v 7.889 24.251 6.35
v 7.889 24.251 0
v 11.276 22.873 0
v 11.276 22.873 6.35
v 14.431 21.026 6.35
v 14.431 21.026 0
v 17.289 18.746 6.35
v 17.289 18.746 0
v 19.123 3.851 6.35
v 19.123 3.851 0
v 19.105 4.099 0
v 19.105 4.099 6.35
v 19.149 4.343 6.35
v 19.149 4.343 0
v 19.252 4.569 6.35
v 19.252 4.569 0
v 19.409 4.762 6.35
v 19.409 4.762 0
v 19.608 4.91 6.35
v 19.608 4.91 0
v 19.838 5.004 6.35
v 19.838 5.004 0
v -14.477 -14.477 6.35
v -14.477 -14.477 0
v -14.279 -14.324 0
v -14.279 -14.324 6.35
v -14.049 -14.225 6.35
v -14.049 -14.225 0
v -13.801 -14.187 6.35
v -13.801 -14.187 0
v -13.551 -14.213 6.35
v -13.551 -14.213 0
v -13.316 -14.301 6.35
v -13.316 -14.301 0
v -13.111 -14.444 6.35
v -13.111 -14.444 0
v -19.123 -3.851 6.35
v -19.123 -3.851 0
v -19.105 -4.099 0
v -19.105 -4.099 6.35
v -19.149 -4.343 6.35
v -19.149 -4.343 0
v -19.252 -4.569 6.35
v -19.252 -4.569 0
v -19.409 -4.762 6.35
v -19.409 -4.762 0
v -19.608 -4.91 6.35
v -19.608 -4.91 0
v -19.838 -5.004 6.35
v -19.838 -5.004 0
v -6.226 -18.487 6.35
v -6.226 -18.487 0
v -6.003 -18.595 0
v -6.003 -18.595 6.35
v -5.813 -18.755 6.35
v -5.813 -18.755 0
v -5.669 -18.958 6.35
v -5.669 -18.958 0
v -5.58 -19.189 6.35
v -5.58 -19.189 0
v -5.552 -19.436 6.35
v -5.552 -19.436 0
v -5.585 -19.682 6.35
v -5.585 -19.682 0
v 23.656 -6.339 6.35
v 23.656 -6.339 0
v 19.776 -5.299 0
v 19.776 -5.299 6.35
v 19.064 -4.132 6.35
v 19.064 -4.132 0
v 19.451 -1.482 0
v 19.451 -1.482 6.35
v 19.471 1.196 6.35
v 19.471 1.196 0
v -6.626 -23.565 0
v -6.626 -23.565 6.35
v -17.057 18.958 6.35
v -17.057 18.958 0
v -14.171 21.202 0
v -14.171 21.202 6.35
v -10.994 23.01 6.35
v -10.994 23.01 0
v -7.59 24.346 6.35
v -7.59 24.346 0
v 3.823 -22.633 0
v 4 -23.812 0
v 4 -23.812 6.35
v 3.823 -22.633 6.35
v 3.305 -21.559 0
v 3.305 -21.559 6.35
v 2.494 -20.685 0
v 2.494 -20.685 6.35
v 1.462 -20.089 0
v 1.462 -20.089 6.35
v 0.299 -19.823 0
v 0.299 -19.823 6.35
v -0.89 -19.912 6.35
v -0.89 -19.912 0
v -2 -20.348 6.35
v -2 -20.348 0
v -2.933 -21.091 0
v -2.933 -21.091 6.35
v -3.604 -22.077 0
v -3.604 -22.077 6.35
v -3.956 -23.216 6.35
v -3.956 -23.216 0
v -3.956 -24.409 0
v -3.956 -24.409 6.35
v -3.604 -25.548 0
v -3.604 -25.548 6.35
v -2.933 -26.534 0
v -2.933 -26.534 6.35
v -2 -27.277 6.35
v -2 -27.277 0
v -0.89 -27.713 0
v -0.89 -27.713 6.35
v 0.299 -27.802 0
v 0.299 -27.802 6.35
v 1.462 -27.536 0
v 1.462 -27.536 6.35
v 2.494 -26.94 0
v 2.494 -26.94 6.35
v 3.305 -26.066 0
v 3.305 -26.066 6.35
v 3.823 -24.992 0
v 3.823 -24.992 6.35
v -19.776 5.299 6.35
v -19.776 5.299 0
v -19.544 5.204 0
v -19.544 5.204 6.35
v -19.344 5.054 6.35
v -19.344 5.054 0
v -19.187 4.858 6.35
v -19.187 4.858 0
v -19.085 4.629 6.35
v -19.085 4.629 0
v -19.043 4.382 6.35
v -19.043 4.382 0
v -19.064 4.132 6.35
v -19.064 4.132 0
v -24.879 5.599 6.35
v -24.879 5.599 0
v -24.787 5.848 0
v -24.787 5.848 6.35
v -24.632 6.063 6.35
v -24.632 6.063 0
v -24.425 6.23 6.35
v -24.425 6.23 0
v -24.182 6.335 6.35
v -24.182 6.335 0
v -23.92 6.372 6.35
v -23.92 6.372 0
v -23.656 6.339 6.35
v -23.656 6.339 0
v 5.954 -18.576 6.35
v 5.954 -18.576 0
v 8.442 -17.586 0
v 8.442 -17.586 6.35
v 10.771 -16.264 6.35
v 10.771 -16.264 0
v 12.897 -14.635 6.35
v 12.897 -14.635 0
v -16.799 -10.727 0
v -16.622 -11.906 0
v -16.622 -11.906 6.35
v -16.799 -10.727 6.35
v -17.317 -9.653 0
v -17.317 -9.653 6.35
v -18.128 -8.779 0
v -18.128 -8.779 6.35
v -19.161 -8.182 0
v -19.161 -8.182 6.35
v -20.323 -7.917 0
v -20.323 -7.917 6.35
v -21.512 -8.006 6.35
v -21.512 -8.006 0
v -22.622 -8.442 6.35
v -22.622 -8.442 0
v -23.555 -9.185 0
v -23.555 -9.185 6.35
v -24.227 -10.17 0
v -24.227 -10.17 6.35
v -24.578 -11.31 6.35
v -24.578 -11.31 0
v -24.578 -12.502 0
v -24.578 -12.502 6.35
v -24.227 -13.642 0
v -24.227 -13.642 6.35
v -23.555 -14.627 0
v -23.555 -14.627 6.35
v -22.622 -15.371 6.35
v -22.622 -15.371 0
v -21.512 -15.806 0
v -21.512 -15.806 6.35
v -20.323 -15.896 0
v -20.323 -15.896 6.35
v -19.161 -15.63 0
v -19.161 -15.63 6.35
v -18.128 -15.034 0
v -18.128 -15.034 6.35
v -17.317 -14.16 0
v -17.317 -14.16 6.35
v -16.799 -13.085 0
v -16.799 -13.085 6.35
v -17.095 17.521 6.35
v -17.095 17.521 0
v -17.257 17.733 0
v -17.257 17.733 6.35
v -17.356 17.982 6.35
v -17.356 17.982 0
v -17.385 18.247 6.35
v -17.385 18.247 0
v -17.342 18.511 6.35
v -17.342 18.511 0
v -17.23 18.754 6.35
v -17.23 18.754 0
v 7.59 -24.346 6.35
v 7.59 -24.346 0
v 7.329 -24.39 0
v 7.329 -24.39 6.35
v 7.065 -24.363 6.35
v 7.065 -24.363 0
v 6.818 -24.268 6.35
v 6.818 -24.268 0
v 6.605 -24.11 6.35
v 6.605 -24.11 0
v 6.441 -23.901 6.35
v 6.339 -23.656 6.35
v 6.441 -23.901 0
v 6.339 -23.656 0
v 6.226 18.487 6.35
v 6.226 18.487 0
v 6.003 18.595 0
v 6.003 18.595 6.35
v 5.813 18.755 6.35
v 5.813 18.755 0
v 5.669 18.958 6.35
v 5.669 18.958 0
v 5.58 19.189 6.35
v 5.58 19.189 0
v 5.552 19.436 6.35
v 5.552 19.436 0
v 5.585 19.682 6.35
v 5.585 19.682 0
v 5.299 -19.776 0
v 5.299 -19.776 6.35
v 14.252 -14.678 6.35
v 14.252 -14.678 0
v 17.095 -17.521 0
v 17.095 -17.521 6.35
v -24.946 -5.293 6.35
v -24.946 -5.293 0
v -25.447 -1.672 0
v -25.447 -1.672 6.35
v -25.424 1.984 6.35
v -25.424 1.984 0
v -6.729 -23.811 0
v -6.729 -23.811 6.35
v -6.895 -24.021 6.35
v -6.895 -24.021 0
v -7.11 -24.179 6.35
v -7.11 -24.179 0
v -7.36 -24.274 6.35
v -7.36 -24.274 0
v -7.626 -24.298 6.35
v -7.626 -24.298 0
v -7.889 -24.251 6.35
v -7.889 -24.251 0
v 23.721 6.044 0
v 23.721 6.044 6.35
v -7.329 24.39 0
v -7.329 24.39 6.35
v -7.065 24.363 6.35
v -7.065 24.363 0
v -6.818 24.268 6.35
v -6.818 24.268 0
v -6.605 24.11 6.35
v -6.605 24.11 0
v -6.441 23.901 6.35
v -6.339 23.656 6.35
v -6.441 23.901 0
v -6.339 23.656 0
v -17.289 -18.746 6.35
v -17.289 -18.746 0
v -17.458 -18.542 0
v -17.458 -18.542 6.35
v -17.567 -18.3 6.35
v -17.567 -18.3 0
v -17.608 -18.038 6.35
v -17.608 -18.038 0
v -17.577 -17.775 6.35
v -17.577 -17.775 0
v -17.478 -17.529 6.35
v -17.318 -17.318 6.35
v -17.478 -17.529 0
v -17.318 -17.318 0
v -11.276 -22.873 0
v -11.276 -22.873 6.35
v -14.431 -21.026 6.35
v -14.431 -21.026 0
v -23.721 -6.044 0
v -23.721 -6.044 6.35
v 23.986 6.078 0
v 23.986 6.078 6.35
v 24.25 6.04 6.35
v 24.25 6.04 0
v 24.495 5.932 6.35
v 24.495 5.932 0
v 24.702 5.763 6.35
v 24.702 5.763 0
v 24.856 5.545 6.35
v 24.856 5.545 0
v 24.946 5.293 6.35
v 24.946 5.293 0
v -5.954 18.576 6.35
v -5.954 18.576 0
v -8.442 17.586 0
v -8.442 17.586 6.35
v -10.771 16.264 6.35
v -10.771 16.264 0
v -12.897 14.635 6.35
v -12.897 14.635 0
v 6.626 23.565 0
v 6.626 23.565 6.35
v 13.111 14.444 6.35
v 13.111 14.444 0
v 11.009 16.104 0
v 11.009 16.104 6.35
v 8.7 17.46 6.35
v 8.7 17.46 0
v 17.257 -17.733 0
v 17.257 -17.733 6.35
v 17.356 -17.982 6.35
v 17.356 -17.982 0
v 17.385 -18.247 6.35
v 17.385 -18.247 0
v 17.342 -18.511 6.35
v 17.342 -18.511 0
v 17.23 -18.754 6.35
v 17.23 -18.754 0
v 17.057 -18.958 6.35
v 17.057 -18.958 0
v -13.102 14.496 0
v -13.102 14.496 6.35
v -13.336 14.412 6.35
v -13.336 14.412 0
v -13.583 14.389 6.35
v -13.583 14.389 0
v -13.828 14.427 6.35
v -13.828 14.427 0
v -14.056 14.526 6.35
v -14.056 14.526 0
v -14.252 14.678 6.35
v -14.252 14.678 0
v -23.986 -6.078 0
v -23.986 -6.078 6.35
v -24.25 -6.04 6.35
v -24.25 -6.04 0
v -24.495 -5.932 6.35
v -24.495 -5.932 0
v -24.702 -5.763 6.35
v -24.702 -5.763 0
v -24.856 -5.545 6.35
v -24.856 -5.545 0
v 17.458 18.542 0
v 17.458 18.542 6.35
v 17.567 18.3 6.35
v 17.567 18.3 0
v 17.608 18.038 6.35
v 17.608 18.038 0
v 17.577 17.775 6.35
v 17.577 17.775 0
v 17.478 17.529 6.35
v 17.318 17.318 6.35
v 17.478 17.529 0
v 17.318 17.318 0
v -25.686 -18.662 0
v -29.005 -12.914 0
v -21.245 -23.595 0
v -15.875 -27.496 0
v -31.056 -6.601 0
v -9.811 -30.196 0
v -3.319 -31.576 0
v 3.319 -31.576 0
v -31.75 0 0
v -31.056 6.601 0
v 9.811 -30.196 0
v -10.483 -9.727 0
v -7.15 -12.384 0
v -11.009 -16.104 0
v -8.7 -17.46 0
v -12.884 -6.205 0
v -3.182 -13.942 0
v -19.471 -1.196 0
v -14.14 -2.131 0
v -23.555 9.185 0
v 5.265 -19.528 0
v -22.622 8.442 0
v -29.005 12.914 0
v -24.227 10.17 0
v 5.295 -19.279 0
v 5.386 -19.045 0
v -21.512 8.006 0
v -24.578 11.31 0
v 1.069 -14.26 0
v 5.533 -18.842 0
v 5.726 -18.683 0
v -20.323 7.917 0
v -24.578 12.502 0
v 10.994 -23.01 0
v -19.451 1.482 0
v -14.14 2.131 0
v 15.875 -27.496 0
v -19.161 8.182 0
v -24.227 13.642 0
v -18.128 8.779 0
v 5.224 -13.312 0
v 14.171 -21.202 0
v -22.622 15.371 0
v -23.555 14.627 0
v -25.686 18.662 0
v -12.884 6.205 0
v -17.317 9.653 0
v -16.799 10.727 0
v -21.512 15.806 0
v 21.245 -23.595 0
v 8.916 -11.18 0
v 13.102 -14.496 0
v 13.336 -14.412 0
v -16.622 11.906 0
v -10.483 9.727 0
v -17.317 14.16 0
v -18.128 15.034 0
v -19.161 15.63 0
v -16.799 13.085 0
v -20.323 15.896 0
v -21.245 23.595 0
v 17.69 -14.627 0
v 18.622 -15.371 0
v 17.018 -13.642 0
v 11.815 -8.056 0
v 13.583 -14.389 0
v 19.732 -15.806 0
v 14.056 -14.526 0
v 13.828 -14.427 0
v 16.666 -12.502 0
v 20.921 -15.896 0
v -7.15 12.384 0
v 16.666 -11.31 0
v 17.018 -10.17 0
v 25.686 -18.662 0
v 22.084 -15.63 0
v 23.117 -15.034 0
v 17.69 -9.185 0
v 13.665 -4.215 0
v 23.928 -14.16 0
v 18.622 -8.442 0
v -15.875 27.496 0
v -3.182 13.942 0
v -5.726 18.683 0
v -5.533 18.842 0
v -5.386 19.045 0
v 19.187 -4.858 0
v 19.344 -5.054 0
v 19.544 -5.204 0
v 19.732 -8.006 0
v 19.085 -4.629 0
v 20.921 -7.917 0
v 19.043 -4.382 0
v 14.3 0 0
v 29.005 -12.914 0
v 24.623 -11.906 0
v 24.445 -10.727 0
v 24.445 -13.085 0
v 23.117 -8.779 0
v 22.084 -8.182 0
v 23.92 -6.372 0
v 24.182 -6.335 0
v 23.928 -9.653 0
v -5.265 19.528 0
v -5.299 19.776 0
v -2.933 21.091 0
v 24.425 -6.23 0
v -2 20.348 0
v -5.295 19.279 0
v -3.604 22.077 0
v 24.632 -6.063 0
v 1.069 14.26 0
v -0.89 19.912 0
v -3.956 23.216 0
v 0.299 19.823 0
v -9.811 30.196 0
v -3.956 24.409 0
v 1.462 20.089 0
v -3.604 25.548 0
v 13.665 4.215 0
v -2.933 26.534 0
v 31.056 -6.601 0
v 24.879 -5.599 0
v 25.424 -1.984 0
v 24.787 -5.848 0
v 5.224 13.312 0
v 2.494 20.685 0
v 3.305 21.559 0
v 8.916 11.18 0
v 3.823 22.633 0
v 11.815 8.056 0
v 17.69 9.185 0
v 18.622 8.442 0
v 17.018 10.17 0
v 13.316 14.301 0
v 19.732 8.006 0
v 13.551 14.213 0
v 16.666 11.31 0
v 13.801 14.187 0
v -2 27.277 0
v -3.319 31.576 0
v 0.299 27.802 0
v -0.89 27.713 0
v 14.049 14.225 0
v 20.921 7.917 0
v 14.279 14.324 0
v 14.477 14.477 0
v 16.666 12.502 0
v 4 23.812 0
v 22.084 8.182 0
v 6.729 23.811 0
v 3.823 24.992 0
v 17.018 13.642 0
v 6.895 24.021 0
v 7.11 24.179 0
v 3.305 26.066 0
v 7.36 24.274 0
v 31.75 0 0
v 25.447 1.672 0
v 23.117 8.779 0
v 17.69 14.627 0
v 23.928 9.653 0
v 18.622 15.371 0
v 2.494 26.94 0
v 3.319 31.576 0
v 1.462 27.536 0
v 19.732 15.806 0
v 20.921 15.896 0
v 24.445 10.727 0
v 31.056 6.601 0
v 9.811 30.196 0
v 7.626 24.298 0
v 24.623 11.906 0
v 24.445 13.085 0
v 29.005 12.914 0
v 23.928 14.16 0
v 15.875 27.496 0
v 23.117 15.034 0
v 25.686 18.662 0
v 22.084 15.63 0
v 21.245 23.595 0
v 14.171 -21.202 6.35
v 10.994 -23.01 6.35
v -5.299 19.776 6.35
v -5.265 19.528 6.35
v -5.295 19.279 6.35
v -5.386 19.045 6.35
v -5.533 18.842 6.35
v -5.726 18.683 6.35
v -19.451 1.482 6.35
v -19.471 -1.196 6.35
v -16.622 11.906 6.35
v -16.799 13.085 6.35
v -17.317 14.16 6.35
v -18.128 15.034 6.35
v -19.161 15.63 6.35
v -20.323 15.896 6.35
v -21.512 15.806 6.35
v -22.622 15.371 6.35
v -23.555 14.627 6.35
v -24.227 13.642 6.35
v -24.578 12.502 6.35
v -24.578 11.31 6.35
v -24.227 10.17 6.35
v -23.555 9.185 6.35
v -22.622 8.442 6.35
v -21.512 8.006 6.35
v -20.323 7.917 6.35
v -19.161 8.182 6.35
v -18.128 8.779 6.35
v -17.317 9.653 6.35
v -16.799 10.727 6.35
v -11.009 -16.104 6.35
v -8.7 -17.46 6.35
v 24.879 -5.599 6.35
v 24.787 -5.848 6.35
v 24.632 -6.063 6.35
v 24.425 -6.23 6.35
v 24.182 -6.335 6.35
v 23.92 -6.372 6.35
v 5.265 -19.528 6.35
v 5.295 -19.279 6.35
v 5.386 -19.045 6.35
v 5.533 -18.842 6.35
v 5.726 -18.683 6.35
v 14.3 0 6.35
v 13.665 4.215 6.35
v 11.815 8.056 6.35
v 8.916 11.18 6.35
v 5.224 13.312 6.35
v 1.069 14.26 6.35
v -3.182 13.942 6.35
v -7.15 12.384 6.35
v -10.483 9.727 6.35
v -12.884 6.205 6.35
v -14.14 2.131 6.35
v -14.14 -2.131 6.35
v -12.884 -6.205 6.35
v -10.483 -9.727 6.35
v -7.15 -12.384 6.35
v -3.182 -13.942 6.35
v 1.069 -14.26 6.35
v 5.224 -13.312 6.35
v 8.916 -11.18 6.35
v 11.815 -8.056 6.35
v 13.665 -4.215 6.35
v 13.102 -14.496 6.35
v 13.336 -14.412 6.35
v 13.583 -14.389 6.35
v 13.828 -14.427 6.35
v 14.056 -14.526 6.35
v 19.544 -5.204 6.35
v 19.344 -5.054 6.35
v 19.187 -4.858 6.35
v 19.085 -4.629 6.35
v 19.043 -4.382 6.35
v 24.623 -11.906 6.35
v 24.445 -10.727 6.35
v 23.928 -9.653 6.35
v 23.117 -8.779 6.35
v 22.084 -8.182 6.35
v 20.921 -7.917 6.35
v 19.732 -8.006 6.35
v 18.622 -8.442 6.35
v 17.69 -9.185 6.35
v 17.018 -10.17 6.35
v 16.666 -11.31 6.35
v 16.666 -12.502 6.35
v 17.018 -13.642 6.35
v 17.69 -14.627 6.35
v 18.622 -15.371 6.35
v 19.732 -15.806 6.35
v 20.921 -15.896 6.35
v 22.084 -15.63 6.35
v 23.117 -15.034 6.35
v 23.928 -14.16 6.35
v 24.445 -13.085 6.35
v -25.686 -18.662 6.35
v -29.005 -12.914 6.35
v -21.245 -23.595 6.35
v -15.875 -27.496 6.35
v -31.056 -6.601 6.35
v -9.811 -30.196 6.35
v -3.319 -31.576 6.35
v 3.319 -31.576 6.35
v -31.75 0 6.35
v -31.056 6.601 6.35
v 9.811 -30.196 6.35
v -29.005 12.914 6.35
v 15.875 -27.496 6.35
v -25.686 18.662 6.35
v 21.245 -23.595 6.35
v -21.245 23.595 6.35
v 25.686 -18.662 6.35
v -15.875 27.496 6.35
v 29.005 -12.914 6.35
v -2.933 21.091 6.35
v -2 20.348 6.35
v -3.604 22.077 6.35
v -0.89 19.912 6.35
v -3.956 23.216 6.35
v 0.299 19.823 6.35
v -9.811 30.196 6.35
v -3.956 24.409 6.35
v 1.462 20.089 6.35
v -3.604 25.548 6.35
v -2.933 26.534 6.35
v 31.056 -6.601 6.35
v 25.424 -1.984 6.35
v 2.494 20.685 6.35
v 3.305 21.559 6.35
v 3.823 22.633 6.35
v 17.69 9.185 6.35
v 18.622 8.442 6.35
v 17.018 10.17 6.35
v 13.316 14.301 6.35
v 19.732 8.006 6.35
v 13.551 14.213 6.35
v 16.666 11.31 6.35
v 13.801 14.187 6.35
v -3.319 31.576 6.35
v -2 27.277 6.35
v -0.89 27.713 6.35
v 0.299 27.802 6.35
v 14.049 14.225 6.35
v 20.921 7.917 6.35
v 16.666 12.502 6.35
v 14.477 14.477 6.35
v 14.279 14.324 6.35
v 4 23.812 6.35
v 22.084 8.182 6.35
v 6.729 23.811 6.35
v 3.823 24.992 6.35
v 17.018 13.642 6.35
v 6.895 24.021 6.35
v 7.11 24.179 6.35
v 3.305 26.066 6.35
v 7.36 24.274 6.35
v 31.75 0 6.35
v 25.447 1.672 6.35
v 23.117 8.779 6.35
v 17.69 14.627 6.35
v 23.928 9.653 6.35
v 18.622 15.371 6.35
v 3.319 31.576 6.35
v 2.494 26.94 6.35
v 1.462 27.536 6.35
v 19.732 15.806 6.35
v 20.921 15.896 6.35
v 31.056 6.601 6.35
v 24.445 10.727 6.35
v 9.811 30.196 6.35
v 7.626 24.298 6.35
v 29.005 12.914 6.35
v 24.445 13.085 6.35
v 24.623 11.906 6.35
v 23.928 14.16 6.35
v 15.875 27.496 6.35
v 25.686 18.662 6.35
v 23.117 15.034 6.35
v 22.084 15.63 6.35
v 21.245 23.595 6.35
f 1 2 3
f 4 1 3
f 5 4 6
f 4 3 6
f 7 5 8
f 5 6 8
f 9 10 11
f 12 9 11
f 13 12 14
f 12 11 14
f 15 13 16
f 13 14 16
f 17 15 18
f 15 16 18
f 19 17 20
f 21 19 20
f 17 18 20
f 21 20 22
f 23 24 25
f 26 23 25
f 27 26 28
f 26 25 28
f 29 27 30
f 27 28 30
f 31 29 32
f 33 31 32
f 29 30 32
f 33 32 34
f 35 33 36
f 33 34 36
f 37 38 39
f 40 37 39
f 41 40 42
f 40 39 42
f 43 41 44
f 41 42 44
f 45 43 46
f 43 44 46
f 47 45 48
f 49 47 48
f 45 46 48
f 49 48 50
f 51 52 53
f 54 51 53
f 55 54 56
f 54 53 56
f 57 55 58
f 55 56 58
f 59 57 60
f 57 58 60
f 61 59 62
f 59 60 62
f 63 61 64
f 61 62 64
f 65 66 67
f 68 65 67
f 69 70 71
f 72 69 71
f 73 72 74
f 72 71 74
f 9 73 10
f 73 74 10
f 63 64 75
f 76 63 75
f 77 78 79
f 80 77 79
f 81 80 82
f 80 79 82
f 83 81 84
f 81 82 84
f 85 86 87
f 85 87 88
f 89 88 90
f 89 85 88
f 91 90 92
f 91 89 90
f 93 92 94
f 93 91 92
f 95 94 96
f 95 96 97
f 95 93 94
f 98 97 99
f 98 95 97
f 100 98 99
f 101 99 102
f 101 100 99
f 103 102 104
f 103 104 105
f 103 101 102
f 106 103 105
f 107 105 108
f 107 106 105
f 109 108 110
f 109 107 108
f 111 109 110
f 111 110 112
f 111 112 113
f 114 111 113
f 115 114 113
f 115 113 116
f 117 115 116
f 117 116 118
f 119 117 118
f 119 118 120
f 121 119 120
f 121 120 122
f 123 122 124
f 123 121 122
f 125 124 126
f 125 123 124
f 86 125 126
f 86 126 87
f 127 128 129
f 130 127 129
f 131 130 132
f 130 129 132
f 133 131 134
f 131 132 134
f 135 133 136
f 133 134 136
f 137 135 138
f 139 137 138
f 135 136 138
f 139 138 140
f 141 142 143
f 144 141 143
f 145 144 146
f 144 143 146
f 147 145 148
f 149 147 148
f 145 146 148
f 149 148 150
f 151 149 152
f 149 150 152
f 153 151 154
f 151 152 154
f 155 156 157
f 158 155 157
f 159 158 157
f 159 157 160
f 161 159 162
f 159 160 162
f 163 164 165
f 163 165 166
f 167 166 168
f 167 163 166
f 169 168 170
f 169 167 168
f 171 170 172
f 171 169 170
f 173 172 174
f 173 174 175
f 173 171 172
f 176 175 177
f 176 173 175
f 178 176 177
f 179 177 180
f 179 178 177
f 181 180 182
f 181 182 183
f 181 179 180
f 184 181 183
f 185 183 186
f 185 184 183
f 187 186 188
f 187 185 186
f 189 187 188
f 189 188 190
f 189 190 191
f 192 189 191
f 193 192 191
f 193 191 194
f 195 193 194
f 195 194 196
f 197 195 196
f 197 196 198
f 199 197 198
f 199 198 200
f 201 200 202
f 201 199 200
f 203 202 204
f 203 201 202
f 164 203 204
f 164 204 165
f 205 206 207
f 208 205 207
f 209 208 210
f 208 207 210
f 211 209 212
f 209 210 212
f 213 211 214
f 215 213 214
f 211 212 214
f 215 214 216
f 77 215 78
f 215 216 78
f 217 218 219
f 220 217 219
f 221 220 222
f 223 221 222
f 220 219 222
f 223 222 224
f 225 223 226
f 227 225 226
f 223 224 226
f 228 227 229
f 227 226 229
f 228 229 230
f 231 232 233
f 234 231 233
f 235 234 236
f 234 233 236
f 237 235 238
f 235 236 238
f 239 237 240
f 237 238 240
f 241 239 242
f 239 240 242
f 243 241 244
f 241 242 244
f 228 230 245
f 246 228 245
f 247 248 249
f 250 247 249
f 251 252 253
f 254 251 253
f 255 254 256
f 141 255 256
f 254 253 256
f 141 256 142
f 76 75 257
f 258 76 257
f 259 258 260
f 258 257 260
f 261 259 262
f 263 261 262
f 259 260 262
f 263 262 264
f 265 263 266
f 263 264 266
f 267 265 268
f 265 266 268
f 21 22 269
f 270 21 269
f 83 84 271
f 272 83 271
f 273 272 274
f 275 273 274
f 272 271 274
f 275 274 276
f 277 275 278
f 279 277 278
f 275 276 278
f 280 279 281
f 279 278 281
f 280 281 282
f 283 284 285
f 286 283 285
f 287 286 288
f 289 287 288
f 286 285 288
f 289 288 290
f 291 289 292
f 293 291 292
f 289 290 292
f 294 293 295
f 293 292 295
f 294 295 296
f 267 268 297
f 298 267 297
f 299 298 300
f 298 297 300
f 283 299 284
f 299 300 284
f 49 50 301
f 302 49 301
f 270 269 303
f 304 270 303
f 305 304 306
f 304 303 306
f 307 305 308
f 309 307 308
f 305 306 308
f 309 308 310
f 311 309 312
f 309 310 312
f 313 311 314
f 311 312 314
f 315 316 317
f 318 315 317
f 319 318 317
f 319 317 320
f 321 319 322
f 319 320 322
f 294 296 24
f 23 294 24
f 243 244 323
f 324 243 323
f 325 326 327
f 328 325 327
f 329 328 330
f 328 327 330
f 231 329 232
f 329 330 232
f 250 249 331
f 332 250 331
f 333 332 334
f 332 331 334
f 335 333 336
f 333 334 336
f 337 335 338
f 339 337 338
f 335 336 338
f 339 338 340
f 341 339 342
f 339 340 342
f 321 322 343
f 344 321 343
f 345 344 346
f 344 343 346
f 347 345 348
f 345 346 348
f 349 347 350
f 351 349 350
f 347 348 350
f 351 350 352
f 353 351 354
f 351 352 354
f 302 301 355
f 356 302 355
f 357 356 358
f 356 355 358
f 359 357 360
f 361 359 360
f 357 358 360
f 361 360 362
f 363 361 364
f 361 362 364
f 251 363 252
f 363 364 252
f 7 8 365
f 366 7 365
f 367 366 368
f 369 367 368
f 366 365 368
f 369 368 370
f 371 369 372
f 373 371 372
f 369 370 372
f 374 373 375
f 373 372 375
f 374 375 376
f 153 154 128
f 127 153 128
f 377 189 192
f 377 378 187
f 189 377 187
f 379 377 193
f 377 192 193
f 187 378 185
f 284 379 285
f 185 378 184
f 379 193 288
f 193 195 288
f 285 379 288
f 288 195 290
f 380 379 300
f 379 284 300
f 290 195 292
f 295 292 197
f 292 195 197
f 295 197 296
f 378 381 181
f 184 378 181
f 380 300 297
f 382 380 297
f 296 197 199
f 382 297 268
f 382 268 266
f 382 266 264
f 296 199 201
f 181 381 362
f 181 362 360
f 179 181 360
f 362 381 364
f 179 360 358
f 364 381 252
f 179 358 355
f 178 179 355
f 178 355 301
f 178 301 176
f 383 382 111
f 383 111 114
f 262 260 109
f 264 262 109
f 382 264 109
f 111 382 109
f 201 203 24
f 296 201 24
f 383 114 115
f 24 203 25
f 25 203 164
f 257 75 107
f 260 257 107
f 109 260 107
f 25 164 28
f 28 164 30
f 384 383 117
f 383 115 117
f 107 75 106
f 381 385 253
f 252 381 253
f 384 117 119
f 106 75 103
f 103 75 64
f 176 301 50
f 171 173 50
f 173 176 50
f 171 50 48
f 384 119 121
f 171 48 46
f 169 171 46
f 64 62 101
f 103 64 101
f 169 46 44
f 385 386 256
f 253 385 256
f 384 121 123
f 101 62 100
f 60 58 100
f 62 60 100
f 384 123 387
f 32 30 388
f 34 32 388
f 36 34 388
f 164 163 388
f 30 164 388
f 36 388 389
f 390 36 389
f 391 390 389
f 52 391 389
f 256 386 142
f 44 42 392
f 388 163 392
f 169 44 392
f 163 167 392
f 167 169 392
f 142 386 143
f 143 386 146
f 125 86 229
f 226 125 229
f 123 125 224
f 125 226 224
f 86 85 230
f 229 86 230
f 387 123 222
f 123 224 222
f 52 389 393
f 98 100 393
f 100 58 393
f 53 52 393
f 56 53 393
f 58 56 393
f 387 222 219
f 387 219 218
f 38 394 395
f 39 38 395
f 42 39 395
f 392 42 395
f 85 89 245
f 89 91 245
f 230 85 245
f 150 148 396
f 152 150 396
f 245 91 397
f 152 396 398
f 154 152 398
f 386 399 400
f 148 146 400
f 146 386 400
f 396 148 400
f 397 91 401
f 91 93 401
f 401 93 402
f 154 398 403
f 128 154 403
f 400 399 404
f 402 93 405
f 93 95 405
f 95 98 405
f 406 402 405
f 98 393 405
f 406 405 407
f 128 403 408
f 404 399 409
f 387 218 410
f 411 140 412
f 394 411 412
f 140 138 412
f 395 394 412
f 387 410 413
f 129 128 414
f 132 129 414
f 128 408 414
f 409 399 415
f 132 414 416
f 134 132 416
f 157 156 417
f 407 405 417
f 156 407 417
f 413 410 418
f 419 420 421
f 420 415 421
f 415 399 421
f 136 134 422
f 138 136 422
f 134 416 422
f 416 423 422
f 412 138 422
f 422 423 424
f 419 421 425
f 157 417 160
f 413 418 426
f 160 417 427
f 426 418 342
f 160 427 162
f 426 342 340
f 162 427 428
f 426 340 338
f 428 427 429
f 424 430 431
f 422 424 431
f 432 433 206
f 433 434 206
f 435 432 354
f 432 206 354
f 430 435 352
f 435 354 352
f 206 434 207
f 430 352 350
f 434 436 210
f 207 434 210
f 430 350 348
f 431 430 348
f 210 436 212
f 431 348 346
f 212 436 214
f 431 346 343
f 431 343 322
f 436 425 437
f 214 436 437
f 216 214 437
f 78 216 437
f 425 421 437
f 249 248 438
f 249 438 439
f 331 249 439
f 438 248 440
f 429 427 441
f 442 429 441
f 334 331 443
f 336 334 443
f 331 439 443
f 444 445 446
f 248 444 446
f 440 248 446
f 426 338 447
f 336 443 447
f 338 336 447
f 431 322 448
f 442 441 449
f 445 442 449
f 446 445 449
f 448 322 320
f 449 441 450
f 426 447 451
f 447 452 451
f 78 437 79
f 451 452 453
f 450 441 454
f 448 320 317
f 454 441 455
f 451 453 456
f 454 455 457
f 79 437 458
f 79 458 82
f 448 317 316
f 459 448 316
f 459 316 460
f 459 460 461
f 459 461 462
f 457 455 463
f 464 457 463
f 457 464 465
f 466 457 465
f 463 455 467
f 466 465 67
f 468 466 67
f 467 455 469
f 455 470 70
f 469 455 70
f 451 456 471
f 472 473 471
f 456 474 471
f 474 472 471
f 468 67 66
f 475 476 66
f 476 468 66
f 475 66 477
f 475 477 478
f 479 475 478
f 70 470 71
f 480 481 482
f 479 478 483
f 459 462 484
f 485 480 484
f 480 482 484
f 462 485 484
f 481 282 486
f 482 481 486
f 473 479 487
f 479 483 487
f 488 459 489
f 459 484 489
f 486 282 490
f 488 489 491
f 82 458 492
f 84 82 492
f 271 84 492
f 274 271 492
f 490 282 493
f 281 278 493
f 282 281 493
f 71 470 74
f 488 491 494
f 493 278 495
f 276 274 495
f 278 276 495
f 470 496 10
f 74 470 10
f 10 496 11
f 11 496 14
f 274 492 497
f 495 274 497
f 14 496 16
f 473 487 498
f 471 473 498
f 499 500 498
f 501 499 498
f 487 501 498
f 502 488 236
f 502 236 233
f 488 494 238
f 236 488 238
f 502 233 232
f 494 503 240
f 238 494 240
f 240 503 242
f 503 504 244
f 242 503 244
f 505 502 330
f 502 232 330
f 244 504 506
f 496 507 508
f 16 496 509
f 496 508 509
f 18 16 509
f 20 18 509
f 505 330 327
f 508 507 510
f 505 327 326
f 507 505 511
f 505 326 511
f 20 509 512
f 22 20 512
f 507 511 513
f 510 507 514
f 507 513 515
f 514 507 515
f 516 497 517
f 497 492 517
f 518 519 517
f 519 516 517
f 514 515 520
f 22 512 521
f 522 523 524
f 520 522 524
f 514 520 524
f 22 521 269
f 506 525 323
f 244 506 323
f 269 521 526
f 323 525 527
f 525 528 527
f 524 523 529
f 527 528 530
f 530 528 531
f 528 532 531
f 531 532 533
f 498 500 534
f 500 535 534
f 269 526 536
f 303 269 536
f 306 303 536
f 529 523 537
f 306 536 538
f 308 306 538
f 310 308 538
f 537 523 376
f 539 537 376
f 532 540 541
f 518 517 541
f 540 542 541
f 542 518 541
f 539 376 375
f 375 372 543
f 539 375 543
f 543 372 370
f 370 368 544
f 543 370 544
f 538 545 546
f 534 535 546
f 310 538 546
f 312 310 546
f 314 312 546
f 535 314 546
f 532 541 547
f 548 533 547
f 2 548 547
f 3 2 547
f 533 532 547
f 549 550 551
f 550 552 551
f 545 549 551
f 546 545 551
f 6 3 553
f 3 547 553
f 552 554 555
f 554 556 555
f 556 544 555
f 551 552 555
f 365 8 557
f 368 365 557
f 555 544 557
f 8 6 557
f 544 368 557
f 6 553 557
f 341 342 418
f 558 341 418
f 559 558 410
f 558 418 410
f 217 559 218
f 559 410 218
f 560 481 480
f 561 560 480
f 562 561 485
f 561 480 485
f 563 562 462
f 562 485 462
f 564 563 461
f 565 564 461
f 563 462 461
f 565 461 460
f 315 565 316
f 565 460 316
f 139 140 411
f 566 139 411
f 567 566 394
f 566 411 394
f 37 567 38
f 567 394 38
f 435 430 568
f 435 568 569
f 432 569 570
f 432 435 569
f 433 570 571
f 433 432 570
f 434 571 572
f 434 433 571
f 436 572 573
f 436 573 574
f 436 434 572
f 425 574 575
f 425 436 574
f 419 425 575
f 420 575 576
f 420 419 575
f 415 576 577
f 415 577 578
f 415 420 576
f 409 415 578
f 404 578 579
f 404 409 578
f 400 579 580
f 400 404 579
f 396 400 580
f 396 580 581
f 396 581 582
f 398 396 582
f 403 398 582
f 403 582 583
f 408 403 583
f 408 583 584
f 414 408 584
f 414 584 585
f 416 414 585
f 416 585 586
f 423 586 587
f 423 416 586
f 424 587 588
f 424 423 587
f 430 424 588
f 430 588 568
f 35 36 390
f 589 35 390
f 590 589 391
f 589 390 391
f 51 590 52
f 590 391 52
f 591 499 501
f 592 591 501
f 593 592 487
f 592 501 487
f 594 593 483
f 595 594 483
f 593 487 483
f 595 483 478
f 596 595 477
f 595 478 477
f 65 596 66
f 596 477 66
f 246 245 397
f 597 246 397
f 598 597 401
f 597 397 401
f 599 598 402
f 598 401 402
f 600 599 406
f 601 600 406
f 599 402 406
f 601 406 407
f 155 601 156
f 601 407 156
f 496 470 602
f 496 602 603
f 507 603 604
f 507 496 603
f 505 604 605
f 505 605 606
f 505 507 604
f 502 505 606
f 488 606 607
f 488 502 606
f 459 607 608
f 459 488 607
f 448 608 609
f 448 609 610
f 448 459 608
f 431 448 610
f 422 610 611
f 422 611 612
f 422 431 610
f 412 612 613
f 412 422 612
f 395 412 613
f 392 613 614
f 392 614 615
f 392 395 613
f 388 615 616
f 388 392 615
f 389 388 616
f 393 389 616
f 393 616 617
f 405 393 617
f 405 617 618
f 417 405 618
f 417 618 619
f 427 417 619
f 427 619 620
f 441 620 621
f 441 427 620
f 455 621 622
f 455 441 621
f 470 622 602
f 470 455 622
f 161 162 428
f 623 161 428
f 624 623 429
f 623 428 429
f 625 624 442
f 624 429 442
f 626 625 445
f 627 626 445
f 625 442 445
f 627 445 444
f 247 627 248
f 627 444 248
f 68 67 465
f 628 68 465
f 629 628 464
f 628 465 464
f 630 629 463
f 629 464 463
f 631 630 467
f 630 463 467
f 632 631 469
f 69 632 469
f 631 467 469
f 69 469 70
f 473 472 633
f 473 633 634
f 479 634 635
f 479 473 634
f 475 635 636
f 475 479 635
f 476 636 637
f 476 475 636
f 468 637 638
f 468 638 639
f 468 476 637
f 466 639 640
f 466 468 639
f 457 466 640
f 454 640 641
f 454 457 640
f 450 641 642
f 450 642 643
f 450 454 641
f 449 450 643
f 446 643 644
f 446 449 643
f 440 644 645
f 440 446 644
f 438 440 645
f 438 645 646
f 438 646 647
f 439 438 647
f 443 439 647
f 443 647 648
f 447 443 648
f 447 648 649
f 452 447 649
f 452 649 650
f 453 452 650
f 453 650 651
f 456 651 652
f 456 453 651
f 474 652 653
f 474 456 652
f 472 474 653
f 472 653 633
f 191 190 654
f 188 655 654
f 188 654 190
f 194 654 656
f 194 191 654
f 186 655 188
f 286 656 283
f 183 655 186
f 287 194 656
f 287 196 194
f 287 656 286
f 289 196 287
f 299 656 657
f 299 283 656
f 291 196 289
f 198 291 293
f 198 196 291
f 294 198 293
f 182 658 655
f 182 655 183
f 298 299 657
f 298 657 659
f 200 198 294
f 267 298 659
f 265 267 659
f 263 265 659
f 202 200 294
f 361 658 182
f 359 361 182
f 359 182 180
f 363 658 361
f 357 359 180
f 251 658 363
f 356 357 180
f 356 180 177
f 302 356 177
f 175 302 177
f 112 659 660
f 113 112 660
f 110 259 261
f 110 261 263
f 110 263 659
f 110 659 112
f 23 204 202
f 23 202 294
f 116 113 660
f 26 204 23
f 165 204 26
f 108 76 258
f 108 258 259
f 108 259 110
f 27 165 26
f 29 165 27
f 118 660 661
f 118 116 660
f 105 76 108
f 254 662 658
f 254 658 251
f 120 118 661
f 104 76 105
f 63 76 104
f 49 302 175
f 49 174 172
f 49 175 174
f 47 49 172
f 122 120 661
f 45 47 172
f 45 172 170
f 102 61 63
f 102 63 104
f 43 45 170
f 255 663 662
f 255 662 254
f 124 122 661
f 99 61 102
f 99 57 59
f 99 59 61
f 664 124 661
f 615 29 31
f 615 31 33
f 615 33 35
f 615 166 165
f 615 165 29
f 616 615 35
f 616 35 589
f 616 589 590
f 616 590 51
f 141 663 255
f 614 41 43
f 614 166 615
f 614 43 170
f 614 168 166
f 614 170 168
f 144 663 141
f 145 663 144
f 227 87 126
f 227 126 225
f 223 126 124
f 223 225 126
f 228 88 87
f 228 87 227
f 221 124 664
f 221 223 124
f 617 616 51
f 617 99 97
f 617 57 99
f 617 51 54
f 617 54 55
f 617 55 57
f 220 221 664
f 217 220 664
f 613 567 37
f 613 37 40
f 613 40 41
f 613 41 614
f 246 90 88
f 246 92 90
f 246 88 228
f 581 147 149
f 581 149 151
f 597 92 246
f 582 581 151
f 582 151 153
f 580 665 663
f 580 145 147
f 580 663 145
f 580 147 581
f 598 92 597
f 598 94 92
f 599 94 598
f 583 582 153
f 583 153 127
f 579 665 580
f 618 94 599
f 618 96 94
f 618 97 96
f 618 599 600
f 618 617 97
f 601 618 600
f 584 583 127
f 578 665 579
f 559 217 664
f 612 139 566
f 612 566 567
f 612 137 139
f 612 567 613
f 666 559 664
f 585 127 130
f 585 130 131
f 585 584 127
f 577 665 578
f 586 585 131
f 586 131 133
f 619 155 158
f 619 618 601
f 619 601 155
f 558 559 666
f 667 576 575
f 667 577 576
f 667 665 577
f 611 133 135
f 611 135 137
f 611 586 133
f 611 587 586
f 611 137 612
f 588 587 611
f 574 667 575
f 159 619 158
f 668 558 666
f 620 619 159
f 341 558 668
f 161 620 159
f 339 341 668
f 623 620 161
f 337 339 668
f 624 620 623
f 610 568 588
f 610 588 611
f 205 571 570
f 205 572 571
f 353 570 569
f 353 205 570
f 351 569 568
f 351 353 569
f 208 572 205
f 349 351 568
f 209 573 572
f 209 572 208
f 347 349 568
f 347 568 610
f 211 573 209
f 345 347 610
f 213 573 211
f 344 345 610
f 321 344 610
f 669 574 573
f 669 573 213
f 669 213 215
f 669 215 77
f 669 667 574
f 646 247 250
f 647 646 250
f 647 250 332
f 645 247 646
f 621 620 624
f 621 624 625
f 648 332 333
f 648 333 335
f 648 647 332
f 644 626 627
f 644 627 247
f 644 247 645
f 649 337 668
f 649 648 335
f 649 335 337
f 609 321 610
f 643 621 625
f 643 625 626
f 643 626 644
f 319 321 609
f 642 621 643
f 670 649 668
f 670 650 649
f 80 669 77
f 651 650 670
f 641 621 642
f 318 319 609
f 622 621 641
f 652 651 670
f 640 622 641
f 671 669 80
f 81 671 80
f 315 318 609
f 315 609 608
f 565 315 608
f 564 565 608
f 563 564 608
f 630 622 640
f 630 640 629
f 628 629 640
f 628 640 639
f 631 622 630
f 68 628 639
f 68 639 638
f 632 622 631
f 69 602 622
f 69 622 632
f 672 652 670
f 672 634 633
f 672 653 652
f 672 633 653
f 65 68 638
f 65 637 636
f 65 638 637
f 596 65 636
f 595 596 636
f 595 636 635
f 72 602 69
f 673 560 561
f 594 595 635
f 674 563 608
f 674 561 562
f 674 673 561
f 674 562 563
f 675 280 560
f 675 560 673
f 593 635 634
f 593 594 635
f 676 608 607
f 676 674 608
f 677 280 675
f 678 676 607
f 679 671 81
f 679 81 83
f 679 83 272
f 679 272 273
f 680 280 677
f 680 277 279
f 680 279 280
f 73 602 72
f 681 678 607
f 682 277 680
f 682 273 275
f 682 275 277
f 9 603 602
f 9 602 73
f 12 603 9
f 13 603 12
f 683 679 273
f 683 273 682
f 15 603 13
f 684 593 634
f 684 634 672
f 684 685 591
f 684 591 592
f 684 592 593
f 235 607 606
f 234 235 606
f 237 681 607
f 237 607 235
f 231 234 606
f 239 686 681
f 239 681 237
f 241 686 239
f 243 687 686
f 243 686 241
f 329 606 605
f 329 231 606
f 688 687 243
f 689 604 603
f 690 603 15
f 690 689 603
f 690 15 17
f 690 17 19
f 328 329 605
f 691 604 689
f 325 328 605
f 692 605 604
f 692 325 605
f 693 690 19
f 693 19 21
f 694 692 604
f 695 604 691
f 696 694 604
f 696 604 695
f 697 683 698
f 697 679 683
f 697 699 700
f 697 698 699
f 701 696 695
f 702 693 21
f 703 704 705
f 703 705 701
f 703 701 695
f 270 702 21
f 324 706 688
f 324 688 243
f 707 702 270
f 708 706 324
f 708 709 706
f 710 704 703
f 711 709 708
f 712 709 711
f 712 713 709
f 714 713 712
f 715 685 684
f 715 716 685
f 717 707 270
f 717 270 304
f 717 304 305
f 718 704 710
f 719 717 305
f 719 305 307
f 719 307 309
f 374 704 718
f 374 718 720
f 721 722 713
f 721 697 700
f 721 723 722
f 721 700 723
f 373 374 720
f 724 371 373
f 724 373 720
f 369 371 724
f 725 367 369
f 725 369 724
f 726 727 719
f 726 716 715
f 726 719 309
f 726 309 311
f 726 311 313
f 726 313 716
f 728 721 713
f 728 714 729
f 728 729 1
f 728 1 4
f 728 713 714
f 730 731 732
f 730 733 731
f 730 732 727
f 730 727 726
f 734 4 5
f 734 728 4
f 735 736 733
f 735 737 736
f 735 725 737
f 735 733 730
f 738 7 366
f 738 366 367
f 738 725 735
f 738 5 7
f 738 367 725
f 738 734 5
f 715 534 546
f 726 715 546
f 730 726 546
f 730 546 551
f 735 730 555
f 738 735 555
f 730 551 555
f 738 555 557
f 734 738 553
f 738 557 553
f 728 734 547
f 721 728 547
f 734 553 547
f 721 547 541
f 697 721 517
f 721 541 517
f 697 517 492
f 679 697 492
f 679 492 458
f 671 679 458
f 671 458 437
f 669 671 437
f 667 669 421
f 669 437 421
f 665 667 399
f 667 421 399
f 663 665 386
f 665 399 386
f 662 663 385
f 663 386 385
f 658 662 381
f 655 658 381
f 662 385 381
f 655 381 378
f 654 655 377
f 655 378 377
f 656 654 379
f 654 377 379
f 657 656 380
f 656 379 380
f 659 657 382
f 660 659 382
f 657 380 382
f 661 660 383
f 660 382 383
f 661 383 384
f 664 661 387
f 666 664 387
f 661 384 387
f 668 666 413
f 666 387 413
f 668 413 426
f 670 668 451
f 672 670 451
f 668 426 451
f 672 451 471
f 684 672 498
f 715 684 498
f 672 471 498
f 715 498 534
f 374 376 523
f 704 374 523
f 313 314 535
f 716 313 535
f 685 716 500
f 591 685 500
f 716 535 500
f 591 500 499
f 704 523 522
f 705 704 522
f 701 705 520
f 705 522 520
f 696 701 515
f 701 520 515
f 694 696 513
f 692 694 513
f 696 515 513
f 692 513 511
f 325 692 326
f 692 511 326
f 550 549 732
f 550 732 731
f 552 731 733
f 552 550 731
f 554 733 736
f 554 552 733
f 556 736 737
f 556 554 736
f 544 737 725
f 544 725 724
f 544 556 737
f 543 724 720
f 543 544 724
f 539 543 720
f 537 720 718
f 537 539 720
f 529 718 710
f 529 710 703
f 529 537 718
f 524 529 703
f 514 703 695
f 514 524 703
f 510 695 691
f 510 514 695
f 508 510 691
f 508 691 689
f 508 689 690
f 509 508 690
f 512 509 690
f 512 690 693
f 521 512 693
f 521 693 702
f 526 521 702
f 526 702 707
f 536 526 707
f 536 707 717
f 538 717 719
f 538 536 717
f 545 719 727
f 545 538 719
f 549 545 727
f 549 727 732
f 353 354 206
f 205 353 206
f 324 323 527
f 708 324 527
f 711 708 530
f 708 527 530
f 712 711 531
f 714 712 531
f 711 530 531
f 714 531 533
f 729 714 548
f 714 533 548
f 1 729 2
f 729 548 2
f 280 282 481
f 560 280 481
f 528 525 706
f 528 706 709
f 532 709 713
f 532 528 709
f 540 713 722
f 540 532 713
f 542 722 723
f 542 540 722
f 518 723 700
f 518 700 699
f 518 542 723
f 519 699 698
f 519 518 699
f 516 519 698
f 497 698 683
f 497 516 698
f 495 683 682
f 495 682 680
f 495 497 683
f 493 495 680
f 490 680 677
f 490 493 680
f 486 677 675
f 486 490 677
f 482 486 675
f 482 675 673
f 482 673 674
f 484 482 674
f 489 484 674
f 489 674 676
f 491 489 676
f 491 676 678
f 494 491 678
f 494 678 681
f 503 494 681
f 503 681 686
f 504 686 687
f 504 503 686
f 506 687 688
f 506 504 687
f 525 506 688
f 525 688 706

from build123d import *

# Parameters (mm, degrees)
F0_R     = 31.75
F0_R_2   = 4.0005
F0_R_3   = 14.3002
F1_DEPTH = 6.35


with BuildPart() as f1:
    # F0 (on Top) → F1 (new body)
    with BuildSketch(Plane.XY):
        Circle(F0_R)
        with BuildLine():
            ThreePointArc((-6.226129, -18.486919), (-5.669229, -18.957696), (-5.585454, -19.682094))
            Line((-5.585454, -19.682094), (-6.625875, -23.564999))
            ThreePointArc((-6.625875, -23.564999), (-7.110205, -24.179255), (-7.889173, -24.250619))
            ThreePointArc((-7.889173, -24.250619), (-12.886326, -22.006231), (-17.288853, -18.746391))
            ThreePointArc((-17.288853, -18.746391), (-17.607672, -18.038216), (-17.317734, -17.317734))
            Line((-17.317734, -17.317734), (-14.477198, -14.477198))
            ThreePointArc((-14.477198, -14.477198), (-13.800681, -14.187347), (-13.110948, -14.444165))
            ThreePointArc((-13.110948, -14.444165), (-9.877581, -16.821541), (-6.226129, -18.486919))
        make_face(mode=Mode.SUBTRACT)
        with Locations((-20.62223, -11.90625)):
            Circle(F0_R_2, mode=Mode.SUBTRACT)
        with Locations((0, -23.8125)):
            Circle(F0_R_2, mode=Mode.SUBTRACT)
        with BuildLine():
            ThreePointArc((12.897077, -14.635446), (13.583232, -14.388544), (14.252466, -14.678192))
            Line((14.252466, -14.678192), (17.094951, -17.520676))
            ThreePointArc((17.094951, -17.520676), (17.384746, -18.247246), (17.057066, -18.957534))
            ThreePointArc((17.057066, -18.957534), (12.614792, -22.163001), (7.590424, -24.345781))
            ThreePointArc((7.590424, -24.345781), (6.817717, -24.267799), (6.338731, -23.656465))
            Line((6.338731, -23.656465), (5.299022, -19.77622))
            ThreePointArc((5.299022, -19.77622), (5.386262, -19.045414), (5.95354, -18.576496))
            ThreePointArc((5.95354, -18.576496), (9.629092, -16.965006), (12.897077, -14.635446))
        make_face(mode=Mode.SUBTRACT)
        with Locations((20.62223, -11.90625)):
            Circle(F0_R_2, mode=Mode.SUBTRACT)
        with BuildLine():
            ThreePointArc((19.123206, 3.851473), (19.252461, 4.569152), (19.83792, 5.003902))
            Line((19.83792, 5.003902), (23.720826, 6.044323))
            ThreePointArc((23.720826, 6.044323), (24.494951, 5.932009), (24.946239, 5.293085))
            ThreePointArc((24.946239, 5.293085), (25.501118, -0.15677), (24.879277, -5.599391))
            ThreePointArc((24.879277, -5.599391), (24.425389, -6.229583), (23.656465, -6.338731))
            Line((23.656465, -6.338731), (19.77622, -5.299022))
            ThreePointArc((19.77622, -5.299022), (19.186944, -4.858067), (19.064488, -4.132331))
            ThreePointArc((19.064488, -4.132331), (19.506672, -0.143465), (19.123206, 3.851473))
        make_face(mode=Mode.SUBTRACT)
        with BuildLine():
            ThreePointArc((-19.123206, -3.851473), (-19.252461, -4.569152), (-19.83792, -5.003902))
            Line((-19.83792, -5.003902), (-23.720826, -6.044323))
            ThreePointArc((-23.720826, -6.044323), (-24.494951, -5.932009), (-24.946239, -5.293085))
            ThreePointArc((-24.946239, -5.293085), (-25.501118, 0.15677), (-24.879277, 5.599391))
            ThreePointArc((-24.879277, 5.599391), (-24.425389, 6.229583), (-23.656465, 6.338731))
            Line((-23.656465, 6.338731), (-19.77622, 5.299022))
            ThreePointArc((-19.77622, 5.299022), (-19.186944, 4.858067), (-19.064488, 4.132331))
            ThreePointArc((-19.064488, 4.132331), (-19.506672, 0.143465), (-19.123206, -3.851473))
        make_face(mode=Mode.SUBTRACT)
        with Locations((-20.62223, 11.90625)):
            Circle(F0_R_2, mode=Mode.SUBTRACT)
        with BuildLine():
            ThreePointArc((-12.897077, 14.635446), (-13.583232, 14.388544), (-14.252466, 14.678192))
            Line((-14.252466, 14.678192), (-17.094951, 17.520676))
            ThreePointArc((-17.094951, 17.520676), (-17.384746, 18.247246), (-17.057066, 18.957534))
            ThreePointArc((-17.057066, 18.957534), (-12.614792, 22.163001), (-7.590424, 24.345781))
            ThreePointArc((-7.590424, 24.345781), (-6.817717, 24.267799), (-6.338731, 23.656465))
            Line((-6.338731, 23.656465), (-5.299022, 19.77622))
            ThreePointArc((-5.299022, 19.77622), (-5.386262, 19.045414), (-5.95354, 18.576496))
            ThreePointArc((-5.95354, 18.576496), (-9.629092, 16.965006), (-12.897077, 14.635446))
        make_face(mode=Mode.SUBTRACT)
        Circle(F0_R_3, mode=Mode.SUBTRACT)
        with Locations((20.62223, 11.90625)):
            Circle(F0_R_2, mode=Mode.SUBTRACT)
        with BuildLine():
            Line((17.317734, 17.317734), (14.477198, 14.477198))
            ThreePointArc((14.477198, 14.477198), (13.800681, 14.187347), (13.110948, 14.444165))
            ThreePointArc((13.110948, 14.444165), (9.877581, 16.821541), (6.226129, 18.486919))
            ThreePointArc((6.226129, 18.486919), (5.669229, 18.957696), (5.585454, 19.682094))
            Line((5.585454, 19.682094), (6.625875, 23.564999))
            ThreePointArc((6.625875, 23.564999), (7.110205, 24.179255), (7.889173, 24.250619))
            ThreePointArc((7.889173, 24.250619), (12.886326, 22.006231), (17.288853, 18.746391))
            ThreePointArc((17.288853, 18.746391), (17.607672, 18.038216), (17.317734, 17.317734))
        make_face(mode=Mode.SUBTRACT)
        with Locations((0, 23.8125)):
            Circle(F0_R_2, mode=Mode.SUBTRACT)
    extrude(amount=F1_DEPTH)


solid = f1.part
